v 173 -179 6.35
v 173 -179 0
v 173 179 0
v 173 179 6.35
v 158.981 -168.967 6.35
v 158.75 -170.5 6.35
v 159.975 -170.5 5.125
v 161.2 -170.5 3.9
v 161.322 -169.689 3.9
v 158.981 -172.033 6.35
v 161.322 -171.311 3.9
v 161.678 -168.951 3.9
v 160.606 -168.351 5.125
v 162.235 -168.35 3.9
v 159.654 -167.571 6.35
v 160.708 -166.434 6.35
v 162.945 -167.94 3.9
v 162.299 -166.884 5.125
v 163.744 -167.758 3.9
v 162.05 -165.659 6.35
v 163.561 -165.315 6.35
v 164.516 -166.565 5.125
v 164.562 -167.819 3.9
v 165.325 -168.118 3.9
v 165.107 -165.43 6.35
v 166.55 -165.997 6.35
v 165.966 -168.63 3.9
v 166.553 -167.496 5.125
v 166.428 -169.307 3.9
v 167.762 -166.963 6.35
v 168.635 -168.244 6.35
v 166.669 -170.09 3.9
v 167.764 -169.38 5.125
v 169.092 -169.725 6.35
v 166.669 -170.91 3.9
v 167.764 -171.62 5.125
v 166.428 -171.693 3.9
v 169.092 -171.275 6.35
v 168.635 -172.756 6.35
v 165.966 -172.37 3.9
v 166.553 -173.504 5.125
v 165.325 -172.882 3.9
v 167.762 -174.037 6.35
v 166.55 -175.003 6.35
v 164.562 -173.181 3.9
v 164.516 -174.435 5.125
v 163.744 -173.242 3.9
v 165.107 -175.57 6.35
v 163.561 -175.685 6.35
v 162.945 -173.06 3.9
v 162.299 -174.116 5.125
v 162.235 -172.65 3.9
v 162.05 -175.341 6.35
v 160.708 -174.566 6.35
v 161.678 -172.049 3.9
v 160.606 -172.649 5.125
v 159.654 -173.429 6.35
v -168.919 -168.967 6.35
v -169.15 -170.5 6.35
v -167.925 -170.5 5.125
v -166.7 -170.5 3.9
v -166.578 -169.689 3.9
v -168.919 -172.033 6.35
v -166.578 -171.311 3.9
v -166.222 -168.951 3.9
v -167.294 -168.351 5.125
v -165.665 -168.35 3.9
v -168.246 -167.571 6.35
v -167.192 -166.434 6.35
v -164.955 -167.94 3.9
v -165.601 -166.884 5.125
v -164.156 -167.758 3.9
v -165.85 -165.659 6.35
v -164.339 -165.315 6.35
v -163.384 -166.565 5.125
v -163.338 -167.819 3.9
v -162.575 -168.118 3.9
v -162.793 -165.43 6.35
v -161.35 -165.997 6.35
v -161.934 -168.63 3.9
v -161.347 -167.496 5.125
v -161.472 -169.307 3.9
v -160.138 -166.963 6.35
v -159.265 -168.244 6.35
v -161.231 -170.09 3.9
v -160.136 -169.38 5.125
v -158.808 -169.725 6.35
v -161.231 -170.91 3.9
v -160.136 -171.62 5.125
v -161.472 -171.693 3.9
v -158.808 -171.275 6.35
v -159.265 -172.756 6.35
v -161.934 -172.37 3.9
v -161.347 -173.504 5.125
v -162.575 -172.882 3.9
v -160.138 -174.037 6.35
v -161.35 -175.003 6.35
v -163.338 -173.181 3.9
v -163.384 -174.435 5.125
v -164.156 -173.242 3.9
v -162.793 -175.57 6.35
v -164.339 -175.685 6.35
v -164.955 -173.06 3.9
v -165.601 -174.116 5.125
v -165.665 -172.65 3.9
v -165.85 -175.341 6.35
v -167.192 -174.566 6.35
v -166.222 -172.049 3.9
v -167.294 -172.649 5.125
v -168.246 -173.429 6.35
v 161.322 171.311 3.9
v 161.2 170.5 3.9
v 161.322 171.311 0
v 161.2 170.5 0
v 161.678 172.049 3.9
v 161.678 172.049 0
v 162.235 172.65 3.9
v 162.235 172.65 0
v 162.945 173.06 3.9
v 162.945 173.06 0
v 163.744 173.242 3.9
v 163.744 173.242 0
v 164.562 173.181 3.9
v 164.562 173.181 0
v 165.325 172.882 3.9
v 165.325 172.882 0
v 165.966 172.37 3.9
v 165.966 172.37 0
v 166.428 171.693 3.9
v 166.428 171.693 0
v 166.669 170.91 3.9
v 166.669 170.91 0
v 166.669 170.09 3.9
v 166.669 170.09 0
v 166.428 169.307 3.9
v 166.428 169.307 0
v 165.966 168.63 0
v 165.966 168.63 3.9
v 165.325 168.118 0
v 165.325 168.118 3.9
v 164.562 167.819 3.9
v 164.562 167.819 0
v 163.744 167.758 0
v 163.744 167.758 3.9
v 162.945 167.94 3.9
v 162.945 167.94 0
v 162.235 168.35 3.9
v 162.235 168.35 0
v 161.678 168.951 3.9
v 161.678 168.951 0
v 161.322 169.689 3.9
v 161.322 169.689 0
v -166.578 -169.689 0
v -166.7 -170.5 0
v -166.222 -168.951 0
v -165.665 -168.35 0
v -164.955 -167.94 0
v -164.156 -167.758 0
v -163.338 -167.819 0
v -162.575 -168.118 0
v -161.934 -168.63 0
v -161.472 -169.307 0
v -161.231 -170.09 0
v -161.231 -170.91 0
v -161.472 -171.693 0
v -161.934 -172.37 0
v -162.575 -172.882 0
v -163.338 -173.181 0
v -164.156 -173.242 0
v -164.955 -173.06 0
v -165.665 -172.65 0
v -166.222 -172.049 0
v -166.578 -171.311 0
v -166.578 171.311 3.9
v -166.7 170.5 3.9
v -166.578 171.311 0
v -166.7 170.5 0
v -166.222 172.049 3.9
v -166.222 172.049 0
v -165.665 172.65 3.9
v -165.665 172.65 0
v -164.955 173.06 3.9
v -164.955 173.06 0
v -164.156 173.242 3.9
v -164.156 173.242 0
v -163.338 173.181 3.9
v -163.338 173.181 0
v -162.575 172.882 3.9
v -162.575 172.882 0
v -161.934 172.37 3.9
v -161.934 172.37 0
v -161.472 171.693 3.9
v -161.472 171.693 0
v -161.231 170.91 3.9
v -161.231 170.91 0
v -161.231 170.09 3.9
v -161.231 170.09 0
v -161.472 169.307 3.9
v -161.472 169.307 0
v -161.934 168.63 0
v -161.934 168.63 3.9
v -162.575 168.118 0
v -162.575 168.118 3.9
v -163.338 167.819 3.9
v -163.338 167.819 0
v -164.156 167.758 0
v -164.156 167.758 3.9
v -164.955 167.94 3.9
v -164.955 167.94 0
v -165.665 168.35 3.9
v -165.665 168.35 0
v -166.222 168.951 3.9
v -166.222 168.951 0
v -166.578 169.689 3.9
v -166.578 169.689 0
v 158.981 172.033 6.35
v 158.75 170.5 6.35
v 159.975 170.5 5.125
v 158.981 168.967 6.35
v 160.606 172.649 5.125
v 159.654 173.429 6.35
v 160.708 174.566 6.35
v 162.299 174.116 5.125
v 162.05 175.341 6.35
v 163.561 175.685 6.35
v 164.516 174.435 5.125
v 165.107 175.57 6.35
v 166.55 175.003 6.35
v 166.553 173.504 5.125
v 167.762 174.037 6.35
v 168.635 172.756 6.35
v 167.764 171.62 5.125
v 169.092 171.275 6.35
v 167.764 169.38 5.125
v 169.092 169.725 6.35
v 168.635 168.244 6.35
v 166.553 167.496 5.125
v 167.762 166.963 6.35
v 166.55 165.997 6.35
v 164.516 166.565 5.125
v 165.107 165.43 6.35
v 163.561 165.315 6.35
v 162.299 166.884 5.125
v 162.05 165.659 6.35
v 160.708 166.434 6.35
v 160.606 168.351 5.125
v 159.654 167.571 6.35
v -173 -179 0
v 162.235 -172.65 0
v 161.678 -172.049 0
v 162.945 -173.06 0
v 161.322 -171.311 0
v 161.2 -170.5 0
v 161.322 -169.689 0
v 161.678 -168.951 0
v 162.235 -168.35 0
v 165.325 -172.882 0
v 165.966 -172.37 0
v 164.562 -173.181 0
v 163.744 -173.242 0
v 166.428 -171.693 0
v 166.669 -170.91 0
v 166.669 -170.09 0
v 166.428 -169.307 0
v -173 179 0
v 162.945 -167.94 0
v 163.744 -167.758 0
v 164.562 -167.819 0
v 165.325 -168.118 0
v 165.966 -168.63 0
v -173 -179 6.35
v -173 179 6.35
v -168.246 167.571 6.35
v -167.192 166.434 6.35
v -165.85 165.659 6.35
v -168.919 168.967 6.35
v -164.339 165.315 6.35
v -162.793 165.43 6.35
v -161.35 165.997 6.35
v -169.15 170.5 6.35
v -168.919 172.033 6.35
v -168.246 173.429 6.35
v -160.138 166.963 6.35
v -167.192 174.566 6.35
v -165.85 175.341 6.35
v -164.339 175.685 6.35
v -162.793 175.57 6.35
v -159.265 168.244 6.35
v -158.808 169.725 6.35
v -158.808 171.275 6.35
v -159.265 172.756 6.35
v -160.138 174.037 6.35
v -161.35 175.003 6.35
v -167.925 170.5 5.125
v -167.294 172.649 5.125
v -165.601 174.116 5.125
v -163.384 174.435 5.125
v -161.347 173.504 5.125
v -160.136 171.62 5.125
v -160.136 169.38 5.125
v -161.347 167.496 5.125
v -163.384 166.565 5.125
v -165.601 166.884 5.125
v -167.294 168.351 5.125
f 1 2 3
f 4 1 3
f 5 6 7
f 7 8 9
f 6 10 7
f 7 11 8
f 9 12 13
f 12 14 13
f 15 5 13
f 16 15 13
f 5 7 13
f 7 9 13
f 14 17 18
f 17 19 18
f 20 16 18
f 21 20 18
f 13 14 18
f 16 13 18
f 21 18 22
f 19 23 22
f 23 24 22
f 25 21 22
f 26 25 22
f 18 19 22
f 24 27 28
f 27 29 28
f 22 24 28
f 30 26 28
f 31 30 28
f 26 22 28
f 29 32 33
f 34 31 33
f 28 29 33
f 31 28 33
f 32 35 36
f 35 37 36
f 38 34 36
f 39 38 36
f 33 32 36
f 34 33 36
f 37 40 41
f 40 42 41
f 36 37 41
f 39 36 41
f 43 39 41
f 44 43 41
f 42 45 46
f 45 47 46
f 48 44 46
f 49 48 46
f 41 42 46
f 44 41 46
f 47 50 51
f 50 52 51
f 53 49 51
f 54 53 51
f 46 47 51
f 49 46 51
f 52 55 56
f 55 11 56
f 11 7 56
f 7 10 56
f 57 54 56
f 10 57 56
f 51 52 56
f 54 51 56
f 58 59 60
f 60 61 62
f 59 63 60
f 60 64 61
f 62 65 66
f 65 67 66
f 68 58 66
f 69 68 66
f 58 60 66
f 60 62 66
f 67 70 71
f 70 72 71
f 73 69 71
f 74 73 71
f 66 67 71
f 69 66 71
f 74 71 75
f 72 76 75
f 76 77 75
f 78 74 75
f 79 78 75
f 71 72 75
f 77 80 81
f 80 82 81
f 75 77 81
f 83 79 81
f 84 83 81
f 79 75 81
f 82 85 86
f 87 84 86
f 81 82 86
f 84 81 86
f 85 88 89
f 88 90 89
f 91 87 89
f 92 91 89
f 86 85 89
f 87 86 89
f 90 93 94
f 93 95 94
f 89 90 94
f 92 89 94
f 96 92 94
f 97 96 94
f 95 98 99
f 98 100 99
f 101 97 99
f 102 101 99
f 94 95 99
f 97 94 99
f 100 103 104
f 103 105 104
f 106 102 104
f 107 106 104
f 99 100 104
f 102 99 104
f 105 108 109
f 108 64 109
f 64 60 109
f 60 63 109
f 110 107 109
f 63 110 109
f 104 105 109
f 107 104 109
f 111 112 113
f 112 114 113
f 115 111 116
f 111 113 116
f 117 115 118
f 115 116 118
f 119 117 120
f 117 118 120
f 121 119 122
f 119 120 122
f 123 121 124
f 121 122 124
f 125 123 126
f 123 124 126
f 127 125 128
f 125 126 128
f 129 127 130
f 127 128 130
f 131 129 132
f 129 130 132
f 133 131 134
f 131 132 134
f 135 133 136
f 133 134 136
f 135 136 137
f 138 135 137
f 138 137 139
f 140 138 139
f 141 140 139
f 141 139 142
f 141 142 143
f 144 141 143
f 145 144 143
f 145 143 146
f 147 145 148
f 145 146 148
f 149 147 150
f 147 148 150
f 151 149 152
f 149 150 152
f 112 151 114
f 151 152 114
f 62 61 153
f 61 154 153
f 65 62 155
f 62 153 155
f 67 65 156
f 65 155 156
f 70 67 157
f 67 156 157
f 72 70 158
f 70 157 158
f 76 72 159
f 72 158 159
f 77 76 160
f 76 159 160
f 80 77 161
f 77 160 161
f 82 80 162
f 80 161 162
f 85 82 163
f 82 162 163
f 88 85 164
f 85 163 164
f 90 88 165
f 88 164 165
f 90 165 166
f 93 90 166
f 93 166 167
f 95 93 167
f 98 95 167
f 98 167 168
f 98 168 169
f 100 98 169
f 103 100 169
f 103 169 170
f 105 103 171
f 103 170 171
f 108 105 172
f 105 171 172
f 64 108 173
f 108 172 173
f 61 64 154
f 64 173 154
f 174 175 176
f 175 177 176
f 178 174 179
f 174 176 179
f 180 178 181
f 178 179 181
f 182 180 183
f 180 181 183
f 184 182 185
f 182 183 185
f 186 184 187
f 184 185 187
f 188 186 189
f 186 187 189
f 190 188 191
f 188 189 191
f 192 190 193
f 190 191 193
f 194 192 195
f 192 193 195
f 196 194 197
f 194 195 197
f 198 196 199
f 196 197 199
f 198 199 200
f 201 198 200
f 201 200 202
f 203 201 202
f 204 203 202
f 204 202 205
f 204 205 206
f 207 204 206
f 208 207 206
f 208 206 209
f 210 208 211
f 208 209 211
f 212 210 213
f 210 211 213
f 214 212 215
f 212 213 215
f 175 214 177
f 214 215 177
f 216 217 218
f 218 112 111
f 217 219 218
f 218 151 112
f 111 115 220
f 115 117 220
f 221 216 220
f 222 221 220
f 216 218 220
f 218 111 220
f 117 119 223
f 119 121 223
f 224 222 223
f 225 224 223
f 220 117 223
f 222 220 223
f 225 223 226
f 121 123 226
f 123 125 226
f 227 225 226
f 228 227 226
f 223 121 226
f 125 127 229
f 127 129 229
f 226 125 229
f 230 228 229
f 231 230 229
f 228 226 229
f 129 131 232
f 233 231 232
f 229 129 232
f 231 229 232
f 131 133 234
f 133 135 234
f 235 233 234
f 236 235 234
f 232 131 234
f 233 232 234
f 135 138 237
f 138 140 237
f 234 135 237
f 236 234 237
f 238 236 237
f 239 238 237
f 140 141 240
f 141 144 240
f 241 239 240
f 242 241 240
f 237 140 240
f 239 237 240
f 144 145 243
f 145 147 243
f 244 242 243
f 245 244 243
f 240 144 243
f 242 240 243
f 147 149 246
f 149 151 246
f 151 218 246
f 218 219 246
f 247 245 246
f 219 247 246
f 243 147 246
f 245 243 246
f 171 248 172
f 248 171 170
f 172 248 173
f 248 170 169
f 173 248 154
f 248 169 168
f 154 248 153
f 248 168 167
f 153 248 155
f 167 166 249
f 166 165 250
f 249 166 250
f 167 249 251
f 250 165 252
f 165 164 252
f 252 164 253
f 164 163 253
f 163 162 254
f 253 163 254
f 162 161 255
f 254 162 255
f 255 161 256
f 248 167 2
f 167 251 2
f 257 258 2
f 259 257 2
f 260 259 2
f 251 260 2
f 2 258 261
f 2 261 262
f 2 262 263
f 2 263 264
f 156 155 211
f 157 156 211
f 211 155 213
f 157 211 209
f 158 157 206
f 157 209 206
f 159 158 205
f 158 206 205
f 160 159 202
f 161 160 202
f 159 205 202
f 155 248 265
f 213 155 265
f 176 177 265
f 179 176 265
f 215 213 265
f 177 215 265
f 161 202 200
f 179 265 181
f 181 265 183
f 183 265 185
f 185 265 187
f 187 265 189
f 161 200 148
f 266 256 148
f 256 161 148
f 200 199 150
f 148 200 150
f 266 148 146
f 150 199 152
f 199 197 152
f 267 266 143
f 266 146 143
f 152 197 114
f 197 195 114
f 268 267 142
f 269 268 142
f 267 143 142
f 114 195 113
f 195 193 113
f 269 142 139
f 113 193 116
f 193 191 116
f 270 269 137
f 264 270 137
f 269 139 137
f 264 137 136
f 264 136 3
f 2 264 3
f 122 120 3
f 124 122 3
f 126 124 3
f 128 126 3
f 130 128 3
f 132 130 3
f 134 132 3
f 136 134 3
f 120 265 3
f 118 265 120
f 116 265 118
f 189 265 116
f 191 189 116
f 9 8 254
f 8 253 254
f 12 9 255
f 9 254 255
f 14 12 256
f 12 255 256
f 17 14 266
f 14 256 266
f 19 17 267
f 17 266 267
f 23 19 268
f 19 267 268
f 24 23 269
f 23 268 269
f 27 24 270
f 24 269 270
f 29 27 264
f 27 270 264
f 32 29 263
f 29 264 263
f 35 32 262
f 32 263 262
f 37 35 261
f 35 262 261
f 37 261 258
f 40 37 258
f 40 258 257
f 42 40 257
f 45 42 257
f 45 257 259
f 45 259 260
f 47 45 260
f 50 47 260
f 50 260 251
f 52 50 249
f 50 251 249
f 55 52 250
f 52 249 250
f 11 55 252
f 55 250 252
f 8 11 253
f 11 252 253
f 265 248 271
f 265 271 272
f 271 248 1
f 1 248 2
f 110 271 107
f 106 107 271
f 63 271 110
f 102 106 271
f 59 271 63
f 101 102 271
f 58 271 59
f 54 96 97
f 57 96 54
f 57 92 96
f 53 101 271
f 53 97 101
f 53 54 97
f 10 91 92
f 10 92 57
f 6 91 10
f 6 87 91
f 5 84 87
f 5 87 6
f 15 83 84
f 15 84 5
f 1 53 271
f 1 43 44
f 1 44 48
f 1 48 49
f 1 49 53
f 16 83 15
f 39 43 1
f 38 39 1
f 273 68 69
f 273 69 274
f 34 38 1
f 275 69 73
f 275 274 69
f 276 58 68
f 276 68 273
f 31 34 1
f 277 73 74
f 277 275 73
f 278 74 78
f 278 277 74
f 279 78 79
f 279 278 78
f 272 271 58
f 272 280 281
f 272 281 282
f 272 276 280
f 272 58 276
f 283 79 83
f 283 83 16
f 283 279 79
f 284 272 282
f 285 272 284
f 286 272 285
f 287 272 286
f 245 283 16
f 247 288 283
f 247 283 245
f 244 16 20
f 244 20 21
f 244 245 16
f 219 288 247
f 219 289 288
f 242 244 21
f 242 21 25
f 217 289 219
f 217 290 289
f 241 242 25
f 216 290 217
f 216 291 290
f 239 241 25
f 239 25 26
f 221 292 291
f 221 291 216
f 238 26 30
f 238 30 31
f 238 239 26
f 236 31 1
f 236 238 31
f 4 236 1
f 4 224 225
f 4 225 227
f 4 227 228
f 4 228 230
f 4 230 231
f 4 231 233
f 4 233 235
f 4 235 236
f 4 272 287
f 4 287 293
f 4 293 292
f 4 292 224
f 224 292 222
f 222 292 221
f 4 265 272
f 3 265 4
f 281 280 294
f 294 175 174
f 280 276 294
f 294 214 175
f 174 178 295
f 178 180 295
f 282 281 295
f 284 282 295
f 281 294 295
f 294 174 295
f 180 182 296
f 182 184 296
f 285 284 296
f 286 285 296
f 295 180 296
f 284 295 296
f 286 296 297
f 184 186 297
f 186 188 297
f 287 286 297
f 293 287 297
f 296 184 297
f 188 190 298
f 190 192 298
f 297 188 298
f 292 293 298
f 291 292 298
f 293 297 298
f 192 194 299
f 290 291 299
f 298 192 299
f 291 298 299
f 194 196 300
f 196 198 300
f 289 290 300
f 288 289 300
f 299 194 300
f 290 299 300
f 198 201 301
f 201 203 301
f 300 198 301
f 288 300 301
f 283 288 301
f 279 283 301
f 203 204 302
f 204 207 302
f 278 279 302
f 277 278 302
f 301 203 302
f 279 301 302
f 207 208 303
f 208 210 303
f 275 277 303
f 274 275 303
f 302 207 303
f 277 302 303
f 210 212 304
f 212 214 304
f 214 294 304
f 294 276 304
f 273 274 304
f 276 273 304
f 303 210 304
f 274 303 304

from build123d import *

# Parameters (mm, degrees)
MODEL_W                                         = 346
MODEL_H                                         = 358
BOSS_EXTRUDE1_DEPTH                             = 6.35
CUT_EXTRUDE1_REACH                              = 251.019
SKETCH2_R                                       = 2.55
CSK_FOR_M5_FLAT_HEAD_MACHINE_SCREW1_D           = 5.5
CSK_FOR_M5_FLAT_HEAD_MACHINE_SCREW1_CSINK_D     = 10.4
CSK_FOR_M5_FLAT_HEAD_MACHINE_SCREW1_CSINK_ANGLE = 90


with BuildPart() as part:
    # Model → Boss-Extrude1 (new body)
    with BuildSketch(Plane.XY):
        Rectangle(MODEL_W, MODEL_H)
    extrude(amount=BOSS_EXTRUDE1_DEPTH)

    # Sketch2 → Cut-Extrude1 (cut, up to next)
    with BuildSketch(Plane.XY.offset(6.35), mode=Mode.PRIVATE) as cut_extrude1_sk1:
        with Locations((-163.95, 170.5)):
            Circle(SKETCH2_R)
    cut_extrude1_tool1 = extrude(cut_extrude1_sk1.sketch, amount=-CUT_EXTRUDE1_REACH, mode=Mode.PRIVATE) & part.part
    # Sketch2 → Cut-Extrude1 (cut, up to next)
    with BuildSketch(Plane.XY.offset(6.35), mode=Mode.PRIVATE) as cut_extrude1_sk2:
        with Locations((-163.95, -170.5)):
            Circle(SKETCH2_R)
    cut_extrude1_tool2 = extrude(cut_extrude1_sk2.sketch, amount=-CUT_EXTRUDE1_REACH, mode=Mode.PRIVATE) & part.part
    # Sketch2 → Cut-Extrude1 (cut, up to next)
    with BuildSketch(Plane.XY.offset(6.35), mode=Mode.PRIVATE) as cut_extrude1_sk3:
        with Locations((163.95, -170.5)):
            Circle(SKETCH2_R)
    cut_extrude1_tool3 = extrude(cut_extrude1_sk3.sketch, amount=-CUT_EXTRUDE1_REACH, mode=Mode.PRIVATE) & part.part
    # Sketch2 → Cut-Extrude1 (cut, up to next)
    with BuildSketch(Plane.XY.offset(6.35), mode=Mode.PRIVATE) as cut_extrude1_sk4:
        with Locations((163.95, 170.5)):
            Circle(SKETCH2_R)
    cut_extrude1_tool4 = extrude(cut_extrude1_sk4.sketch, amount=-CUT_EXTRUDE1_REACH, mode=Mode.PRIVATE) & part.part
    add(cut_extrude1_tool1.solids().sort_by_distance((-163.95, 170.5, 6.35))[0], mode=Mode.SUBTRACT)
    add(cut_extrude1_tool2.solids().sort_by_distance((-163.95, -170.5, 6.35))[0], mode=Mode.SUBTRACT)
    add(cut_extrude1_tool3.solids().sort_by_distance((163.95, -170.5, 6.35))[0], mode=Mode.SUBTRACT)
    add(cut_extrude1_tool4.solids().sort_by_distance((163.95, 170.5, 6.35))[0], mode=Mode.SUBTRACT)

    # CSK for M5 Flat Head Machine Screw1 (through all)
    with Locations(Plane.XY.offset(6.35)):
        with Locations((-163.95, 170.5), (163.95, 170.5), (163.95, -170.5), (-163.95, -170.5)):
            CounterSinkHole(CSK_FOR_M5_FLAT_HEAD_MACHINE_SCREW1_D / 2, CSK_FOR_M5_FLAT_HEAD_MACHINE_SCREW1_CSINK_D / 2, counter_sink_angle=CSK_FOR_M5_FLAT_HEAD_MACHINE_SCREW1_CSINK_ANGLE)


solid = part.part
